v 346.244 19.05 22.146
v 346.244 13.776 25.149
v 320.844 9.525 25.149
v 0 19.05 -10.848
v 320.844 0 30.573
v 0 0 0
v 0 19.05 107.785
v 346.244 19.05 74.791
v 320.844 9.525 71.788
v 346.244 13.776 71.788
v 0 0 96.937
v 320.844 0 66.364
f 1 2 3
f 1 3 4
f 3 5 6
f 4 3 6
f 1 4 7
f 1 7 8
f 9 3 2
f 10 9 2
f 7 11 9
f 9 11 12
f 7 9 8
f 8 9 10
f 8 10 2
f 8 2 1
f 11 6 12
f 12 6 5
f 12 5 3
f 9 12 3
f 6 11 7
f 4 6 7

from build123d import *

# Parameters (mm, degrees)
BOSS_EXTRUDE1_DEPTH     = 19.05
BOSS_EXTRUDE1_DRAFT     = -29.54735891
CUT_EXTRUDE1_DEPTH      = 374.741958864
CUT_EXTRUDE1_DEPTH_BACK = 374.741958864
SKETCH2_OUTSIDE_W       = 447.362
SKETCH2_OUTSIDE_H       = 98.57
SKETCH2_OUTSIDE_W_2     = 346.244171738
SKETCH2_OUTSIDE_H_2     = 100.341978652
CUT_EXTRUDE2_DEPTH      = 364.132941986


with BuildPart() as part:
    # Sketch1 → Boss-Extrude1 (with draft: the straight prism first)
    with BuildSketch(Plane(origin=(0, 0, 0), x_dir=(1, 0, 0), z_dir=(0, 1, 0))):
        Polygon((0, 0), (0, -96.93730792), (346.244171738, -63.94360396), (346.244171738, -32.99370396), align=None)
    extrude(amount=BOSS_EXTRUDE1_DEPTH)
    # Boss-Extrude1: the draft: its side faces are tilted about the plane it starts from
    boss_extrude1_sides = [part.faces().sort_by_distance(p)[0] for p in [
        (0, 9.525, 48.46865396),
        (173.122085869, 9.525, 80.44045594),
        (346.244171738, 9.525, 48.46865396),
        (173.122085869, 9.525, 16.49685198),
    ]]
    draft(boss_extrude1_sides, Plane(origin=(0, 0, 0), x_dir=(1, 0, 0), z_dir=(0, 1, 0)), BOSS_EXTRUDE1_DRAFT)

    # Sketch2 outside → Cut-Extrude1 (cut, two sides: drawn at the far end of the back side and taken through both)
    with BuildSketch(Plane.XY.offset(-CUT_EXTRUDE1_DEPTH_BACK)):
        with Locations((173.122, 9.525)):
            Rectangle(SKETCH2_OUTSIDE_W, SKETCH2_OUTSIDE_H)
        with Locations((173.122085869, 50.170989326)):
            Rectangle(SKETCH2_OUTSIDE_W_2, SKETCH2_OUTSIDE_H_2, mode=Mode.SUBTRACT)
    extrude(amount=CUT_EXTRUDE1_DEPTH + CUT_EXTRUDE1_DEPTH_BACK, mode=Mode.SUBTRACT)

    # Sketch3 → Cut-Extrude2 (cut, through all)
    with BuildSketch(Plane.XY):
        Polygon((320.844171738, 0), (320.844171738, 9.525), (346.244171738, 13.775502271), (346.244171738, 0), align=None)
    extrude(amount=CUT_EXTRUDE2_DEPTH, mode=Mode.SUBTRACT)


solid = part.part
